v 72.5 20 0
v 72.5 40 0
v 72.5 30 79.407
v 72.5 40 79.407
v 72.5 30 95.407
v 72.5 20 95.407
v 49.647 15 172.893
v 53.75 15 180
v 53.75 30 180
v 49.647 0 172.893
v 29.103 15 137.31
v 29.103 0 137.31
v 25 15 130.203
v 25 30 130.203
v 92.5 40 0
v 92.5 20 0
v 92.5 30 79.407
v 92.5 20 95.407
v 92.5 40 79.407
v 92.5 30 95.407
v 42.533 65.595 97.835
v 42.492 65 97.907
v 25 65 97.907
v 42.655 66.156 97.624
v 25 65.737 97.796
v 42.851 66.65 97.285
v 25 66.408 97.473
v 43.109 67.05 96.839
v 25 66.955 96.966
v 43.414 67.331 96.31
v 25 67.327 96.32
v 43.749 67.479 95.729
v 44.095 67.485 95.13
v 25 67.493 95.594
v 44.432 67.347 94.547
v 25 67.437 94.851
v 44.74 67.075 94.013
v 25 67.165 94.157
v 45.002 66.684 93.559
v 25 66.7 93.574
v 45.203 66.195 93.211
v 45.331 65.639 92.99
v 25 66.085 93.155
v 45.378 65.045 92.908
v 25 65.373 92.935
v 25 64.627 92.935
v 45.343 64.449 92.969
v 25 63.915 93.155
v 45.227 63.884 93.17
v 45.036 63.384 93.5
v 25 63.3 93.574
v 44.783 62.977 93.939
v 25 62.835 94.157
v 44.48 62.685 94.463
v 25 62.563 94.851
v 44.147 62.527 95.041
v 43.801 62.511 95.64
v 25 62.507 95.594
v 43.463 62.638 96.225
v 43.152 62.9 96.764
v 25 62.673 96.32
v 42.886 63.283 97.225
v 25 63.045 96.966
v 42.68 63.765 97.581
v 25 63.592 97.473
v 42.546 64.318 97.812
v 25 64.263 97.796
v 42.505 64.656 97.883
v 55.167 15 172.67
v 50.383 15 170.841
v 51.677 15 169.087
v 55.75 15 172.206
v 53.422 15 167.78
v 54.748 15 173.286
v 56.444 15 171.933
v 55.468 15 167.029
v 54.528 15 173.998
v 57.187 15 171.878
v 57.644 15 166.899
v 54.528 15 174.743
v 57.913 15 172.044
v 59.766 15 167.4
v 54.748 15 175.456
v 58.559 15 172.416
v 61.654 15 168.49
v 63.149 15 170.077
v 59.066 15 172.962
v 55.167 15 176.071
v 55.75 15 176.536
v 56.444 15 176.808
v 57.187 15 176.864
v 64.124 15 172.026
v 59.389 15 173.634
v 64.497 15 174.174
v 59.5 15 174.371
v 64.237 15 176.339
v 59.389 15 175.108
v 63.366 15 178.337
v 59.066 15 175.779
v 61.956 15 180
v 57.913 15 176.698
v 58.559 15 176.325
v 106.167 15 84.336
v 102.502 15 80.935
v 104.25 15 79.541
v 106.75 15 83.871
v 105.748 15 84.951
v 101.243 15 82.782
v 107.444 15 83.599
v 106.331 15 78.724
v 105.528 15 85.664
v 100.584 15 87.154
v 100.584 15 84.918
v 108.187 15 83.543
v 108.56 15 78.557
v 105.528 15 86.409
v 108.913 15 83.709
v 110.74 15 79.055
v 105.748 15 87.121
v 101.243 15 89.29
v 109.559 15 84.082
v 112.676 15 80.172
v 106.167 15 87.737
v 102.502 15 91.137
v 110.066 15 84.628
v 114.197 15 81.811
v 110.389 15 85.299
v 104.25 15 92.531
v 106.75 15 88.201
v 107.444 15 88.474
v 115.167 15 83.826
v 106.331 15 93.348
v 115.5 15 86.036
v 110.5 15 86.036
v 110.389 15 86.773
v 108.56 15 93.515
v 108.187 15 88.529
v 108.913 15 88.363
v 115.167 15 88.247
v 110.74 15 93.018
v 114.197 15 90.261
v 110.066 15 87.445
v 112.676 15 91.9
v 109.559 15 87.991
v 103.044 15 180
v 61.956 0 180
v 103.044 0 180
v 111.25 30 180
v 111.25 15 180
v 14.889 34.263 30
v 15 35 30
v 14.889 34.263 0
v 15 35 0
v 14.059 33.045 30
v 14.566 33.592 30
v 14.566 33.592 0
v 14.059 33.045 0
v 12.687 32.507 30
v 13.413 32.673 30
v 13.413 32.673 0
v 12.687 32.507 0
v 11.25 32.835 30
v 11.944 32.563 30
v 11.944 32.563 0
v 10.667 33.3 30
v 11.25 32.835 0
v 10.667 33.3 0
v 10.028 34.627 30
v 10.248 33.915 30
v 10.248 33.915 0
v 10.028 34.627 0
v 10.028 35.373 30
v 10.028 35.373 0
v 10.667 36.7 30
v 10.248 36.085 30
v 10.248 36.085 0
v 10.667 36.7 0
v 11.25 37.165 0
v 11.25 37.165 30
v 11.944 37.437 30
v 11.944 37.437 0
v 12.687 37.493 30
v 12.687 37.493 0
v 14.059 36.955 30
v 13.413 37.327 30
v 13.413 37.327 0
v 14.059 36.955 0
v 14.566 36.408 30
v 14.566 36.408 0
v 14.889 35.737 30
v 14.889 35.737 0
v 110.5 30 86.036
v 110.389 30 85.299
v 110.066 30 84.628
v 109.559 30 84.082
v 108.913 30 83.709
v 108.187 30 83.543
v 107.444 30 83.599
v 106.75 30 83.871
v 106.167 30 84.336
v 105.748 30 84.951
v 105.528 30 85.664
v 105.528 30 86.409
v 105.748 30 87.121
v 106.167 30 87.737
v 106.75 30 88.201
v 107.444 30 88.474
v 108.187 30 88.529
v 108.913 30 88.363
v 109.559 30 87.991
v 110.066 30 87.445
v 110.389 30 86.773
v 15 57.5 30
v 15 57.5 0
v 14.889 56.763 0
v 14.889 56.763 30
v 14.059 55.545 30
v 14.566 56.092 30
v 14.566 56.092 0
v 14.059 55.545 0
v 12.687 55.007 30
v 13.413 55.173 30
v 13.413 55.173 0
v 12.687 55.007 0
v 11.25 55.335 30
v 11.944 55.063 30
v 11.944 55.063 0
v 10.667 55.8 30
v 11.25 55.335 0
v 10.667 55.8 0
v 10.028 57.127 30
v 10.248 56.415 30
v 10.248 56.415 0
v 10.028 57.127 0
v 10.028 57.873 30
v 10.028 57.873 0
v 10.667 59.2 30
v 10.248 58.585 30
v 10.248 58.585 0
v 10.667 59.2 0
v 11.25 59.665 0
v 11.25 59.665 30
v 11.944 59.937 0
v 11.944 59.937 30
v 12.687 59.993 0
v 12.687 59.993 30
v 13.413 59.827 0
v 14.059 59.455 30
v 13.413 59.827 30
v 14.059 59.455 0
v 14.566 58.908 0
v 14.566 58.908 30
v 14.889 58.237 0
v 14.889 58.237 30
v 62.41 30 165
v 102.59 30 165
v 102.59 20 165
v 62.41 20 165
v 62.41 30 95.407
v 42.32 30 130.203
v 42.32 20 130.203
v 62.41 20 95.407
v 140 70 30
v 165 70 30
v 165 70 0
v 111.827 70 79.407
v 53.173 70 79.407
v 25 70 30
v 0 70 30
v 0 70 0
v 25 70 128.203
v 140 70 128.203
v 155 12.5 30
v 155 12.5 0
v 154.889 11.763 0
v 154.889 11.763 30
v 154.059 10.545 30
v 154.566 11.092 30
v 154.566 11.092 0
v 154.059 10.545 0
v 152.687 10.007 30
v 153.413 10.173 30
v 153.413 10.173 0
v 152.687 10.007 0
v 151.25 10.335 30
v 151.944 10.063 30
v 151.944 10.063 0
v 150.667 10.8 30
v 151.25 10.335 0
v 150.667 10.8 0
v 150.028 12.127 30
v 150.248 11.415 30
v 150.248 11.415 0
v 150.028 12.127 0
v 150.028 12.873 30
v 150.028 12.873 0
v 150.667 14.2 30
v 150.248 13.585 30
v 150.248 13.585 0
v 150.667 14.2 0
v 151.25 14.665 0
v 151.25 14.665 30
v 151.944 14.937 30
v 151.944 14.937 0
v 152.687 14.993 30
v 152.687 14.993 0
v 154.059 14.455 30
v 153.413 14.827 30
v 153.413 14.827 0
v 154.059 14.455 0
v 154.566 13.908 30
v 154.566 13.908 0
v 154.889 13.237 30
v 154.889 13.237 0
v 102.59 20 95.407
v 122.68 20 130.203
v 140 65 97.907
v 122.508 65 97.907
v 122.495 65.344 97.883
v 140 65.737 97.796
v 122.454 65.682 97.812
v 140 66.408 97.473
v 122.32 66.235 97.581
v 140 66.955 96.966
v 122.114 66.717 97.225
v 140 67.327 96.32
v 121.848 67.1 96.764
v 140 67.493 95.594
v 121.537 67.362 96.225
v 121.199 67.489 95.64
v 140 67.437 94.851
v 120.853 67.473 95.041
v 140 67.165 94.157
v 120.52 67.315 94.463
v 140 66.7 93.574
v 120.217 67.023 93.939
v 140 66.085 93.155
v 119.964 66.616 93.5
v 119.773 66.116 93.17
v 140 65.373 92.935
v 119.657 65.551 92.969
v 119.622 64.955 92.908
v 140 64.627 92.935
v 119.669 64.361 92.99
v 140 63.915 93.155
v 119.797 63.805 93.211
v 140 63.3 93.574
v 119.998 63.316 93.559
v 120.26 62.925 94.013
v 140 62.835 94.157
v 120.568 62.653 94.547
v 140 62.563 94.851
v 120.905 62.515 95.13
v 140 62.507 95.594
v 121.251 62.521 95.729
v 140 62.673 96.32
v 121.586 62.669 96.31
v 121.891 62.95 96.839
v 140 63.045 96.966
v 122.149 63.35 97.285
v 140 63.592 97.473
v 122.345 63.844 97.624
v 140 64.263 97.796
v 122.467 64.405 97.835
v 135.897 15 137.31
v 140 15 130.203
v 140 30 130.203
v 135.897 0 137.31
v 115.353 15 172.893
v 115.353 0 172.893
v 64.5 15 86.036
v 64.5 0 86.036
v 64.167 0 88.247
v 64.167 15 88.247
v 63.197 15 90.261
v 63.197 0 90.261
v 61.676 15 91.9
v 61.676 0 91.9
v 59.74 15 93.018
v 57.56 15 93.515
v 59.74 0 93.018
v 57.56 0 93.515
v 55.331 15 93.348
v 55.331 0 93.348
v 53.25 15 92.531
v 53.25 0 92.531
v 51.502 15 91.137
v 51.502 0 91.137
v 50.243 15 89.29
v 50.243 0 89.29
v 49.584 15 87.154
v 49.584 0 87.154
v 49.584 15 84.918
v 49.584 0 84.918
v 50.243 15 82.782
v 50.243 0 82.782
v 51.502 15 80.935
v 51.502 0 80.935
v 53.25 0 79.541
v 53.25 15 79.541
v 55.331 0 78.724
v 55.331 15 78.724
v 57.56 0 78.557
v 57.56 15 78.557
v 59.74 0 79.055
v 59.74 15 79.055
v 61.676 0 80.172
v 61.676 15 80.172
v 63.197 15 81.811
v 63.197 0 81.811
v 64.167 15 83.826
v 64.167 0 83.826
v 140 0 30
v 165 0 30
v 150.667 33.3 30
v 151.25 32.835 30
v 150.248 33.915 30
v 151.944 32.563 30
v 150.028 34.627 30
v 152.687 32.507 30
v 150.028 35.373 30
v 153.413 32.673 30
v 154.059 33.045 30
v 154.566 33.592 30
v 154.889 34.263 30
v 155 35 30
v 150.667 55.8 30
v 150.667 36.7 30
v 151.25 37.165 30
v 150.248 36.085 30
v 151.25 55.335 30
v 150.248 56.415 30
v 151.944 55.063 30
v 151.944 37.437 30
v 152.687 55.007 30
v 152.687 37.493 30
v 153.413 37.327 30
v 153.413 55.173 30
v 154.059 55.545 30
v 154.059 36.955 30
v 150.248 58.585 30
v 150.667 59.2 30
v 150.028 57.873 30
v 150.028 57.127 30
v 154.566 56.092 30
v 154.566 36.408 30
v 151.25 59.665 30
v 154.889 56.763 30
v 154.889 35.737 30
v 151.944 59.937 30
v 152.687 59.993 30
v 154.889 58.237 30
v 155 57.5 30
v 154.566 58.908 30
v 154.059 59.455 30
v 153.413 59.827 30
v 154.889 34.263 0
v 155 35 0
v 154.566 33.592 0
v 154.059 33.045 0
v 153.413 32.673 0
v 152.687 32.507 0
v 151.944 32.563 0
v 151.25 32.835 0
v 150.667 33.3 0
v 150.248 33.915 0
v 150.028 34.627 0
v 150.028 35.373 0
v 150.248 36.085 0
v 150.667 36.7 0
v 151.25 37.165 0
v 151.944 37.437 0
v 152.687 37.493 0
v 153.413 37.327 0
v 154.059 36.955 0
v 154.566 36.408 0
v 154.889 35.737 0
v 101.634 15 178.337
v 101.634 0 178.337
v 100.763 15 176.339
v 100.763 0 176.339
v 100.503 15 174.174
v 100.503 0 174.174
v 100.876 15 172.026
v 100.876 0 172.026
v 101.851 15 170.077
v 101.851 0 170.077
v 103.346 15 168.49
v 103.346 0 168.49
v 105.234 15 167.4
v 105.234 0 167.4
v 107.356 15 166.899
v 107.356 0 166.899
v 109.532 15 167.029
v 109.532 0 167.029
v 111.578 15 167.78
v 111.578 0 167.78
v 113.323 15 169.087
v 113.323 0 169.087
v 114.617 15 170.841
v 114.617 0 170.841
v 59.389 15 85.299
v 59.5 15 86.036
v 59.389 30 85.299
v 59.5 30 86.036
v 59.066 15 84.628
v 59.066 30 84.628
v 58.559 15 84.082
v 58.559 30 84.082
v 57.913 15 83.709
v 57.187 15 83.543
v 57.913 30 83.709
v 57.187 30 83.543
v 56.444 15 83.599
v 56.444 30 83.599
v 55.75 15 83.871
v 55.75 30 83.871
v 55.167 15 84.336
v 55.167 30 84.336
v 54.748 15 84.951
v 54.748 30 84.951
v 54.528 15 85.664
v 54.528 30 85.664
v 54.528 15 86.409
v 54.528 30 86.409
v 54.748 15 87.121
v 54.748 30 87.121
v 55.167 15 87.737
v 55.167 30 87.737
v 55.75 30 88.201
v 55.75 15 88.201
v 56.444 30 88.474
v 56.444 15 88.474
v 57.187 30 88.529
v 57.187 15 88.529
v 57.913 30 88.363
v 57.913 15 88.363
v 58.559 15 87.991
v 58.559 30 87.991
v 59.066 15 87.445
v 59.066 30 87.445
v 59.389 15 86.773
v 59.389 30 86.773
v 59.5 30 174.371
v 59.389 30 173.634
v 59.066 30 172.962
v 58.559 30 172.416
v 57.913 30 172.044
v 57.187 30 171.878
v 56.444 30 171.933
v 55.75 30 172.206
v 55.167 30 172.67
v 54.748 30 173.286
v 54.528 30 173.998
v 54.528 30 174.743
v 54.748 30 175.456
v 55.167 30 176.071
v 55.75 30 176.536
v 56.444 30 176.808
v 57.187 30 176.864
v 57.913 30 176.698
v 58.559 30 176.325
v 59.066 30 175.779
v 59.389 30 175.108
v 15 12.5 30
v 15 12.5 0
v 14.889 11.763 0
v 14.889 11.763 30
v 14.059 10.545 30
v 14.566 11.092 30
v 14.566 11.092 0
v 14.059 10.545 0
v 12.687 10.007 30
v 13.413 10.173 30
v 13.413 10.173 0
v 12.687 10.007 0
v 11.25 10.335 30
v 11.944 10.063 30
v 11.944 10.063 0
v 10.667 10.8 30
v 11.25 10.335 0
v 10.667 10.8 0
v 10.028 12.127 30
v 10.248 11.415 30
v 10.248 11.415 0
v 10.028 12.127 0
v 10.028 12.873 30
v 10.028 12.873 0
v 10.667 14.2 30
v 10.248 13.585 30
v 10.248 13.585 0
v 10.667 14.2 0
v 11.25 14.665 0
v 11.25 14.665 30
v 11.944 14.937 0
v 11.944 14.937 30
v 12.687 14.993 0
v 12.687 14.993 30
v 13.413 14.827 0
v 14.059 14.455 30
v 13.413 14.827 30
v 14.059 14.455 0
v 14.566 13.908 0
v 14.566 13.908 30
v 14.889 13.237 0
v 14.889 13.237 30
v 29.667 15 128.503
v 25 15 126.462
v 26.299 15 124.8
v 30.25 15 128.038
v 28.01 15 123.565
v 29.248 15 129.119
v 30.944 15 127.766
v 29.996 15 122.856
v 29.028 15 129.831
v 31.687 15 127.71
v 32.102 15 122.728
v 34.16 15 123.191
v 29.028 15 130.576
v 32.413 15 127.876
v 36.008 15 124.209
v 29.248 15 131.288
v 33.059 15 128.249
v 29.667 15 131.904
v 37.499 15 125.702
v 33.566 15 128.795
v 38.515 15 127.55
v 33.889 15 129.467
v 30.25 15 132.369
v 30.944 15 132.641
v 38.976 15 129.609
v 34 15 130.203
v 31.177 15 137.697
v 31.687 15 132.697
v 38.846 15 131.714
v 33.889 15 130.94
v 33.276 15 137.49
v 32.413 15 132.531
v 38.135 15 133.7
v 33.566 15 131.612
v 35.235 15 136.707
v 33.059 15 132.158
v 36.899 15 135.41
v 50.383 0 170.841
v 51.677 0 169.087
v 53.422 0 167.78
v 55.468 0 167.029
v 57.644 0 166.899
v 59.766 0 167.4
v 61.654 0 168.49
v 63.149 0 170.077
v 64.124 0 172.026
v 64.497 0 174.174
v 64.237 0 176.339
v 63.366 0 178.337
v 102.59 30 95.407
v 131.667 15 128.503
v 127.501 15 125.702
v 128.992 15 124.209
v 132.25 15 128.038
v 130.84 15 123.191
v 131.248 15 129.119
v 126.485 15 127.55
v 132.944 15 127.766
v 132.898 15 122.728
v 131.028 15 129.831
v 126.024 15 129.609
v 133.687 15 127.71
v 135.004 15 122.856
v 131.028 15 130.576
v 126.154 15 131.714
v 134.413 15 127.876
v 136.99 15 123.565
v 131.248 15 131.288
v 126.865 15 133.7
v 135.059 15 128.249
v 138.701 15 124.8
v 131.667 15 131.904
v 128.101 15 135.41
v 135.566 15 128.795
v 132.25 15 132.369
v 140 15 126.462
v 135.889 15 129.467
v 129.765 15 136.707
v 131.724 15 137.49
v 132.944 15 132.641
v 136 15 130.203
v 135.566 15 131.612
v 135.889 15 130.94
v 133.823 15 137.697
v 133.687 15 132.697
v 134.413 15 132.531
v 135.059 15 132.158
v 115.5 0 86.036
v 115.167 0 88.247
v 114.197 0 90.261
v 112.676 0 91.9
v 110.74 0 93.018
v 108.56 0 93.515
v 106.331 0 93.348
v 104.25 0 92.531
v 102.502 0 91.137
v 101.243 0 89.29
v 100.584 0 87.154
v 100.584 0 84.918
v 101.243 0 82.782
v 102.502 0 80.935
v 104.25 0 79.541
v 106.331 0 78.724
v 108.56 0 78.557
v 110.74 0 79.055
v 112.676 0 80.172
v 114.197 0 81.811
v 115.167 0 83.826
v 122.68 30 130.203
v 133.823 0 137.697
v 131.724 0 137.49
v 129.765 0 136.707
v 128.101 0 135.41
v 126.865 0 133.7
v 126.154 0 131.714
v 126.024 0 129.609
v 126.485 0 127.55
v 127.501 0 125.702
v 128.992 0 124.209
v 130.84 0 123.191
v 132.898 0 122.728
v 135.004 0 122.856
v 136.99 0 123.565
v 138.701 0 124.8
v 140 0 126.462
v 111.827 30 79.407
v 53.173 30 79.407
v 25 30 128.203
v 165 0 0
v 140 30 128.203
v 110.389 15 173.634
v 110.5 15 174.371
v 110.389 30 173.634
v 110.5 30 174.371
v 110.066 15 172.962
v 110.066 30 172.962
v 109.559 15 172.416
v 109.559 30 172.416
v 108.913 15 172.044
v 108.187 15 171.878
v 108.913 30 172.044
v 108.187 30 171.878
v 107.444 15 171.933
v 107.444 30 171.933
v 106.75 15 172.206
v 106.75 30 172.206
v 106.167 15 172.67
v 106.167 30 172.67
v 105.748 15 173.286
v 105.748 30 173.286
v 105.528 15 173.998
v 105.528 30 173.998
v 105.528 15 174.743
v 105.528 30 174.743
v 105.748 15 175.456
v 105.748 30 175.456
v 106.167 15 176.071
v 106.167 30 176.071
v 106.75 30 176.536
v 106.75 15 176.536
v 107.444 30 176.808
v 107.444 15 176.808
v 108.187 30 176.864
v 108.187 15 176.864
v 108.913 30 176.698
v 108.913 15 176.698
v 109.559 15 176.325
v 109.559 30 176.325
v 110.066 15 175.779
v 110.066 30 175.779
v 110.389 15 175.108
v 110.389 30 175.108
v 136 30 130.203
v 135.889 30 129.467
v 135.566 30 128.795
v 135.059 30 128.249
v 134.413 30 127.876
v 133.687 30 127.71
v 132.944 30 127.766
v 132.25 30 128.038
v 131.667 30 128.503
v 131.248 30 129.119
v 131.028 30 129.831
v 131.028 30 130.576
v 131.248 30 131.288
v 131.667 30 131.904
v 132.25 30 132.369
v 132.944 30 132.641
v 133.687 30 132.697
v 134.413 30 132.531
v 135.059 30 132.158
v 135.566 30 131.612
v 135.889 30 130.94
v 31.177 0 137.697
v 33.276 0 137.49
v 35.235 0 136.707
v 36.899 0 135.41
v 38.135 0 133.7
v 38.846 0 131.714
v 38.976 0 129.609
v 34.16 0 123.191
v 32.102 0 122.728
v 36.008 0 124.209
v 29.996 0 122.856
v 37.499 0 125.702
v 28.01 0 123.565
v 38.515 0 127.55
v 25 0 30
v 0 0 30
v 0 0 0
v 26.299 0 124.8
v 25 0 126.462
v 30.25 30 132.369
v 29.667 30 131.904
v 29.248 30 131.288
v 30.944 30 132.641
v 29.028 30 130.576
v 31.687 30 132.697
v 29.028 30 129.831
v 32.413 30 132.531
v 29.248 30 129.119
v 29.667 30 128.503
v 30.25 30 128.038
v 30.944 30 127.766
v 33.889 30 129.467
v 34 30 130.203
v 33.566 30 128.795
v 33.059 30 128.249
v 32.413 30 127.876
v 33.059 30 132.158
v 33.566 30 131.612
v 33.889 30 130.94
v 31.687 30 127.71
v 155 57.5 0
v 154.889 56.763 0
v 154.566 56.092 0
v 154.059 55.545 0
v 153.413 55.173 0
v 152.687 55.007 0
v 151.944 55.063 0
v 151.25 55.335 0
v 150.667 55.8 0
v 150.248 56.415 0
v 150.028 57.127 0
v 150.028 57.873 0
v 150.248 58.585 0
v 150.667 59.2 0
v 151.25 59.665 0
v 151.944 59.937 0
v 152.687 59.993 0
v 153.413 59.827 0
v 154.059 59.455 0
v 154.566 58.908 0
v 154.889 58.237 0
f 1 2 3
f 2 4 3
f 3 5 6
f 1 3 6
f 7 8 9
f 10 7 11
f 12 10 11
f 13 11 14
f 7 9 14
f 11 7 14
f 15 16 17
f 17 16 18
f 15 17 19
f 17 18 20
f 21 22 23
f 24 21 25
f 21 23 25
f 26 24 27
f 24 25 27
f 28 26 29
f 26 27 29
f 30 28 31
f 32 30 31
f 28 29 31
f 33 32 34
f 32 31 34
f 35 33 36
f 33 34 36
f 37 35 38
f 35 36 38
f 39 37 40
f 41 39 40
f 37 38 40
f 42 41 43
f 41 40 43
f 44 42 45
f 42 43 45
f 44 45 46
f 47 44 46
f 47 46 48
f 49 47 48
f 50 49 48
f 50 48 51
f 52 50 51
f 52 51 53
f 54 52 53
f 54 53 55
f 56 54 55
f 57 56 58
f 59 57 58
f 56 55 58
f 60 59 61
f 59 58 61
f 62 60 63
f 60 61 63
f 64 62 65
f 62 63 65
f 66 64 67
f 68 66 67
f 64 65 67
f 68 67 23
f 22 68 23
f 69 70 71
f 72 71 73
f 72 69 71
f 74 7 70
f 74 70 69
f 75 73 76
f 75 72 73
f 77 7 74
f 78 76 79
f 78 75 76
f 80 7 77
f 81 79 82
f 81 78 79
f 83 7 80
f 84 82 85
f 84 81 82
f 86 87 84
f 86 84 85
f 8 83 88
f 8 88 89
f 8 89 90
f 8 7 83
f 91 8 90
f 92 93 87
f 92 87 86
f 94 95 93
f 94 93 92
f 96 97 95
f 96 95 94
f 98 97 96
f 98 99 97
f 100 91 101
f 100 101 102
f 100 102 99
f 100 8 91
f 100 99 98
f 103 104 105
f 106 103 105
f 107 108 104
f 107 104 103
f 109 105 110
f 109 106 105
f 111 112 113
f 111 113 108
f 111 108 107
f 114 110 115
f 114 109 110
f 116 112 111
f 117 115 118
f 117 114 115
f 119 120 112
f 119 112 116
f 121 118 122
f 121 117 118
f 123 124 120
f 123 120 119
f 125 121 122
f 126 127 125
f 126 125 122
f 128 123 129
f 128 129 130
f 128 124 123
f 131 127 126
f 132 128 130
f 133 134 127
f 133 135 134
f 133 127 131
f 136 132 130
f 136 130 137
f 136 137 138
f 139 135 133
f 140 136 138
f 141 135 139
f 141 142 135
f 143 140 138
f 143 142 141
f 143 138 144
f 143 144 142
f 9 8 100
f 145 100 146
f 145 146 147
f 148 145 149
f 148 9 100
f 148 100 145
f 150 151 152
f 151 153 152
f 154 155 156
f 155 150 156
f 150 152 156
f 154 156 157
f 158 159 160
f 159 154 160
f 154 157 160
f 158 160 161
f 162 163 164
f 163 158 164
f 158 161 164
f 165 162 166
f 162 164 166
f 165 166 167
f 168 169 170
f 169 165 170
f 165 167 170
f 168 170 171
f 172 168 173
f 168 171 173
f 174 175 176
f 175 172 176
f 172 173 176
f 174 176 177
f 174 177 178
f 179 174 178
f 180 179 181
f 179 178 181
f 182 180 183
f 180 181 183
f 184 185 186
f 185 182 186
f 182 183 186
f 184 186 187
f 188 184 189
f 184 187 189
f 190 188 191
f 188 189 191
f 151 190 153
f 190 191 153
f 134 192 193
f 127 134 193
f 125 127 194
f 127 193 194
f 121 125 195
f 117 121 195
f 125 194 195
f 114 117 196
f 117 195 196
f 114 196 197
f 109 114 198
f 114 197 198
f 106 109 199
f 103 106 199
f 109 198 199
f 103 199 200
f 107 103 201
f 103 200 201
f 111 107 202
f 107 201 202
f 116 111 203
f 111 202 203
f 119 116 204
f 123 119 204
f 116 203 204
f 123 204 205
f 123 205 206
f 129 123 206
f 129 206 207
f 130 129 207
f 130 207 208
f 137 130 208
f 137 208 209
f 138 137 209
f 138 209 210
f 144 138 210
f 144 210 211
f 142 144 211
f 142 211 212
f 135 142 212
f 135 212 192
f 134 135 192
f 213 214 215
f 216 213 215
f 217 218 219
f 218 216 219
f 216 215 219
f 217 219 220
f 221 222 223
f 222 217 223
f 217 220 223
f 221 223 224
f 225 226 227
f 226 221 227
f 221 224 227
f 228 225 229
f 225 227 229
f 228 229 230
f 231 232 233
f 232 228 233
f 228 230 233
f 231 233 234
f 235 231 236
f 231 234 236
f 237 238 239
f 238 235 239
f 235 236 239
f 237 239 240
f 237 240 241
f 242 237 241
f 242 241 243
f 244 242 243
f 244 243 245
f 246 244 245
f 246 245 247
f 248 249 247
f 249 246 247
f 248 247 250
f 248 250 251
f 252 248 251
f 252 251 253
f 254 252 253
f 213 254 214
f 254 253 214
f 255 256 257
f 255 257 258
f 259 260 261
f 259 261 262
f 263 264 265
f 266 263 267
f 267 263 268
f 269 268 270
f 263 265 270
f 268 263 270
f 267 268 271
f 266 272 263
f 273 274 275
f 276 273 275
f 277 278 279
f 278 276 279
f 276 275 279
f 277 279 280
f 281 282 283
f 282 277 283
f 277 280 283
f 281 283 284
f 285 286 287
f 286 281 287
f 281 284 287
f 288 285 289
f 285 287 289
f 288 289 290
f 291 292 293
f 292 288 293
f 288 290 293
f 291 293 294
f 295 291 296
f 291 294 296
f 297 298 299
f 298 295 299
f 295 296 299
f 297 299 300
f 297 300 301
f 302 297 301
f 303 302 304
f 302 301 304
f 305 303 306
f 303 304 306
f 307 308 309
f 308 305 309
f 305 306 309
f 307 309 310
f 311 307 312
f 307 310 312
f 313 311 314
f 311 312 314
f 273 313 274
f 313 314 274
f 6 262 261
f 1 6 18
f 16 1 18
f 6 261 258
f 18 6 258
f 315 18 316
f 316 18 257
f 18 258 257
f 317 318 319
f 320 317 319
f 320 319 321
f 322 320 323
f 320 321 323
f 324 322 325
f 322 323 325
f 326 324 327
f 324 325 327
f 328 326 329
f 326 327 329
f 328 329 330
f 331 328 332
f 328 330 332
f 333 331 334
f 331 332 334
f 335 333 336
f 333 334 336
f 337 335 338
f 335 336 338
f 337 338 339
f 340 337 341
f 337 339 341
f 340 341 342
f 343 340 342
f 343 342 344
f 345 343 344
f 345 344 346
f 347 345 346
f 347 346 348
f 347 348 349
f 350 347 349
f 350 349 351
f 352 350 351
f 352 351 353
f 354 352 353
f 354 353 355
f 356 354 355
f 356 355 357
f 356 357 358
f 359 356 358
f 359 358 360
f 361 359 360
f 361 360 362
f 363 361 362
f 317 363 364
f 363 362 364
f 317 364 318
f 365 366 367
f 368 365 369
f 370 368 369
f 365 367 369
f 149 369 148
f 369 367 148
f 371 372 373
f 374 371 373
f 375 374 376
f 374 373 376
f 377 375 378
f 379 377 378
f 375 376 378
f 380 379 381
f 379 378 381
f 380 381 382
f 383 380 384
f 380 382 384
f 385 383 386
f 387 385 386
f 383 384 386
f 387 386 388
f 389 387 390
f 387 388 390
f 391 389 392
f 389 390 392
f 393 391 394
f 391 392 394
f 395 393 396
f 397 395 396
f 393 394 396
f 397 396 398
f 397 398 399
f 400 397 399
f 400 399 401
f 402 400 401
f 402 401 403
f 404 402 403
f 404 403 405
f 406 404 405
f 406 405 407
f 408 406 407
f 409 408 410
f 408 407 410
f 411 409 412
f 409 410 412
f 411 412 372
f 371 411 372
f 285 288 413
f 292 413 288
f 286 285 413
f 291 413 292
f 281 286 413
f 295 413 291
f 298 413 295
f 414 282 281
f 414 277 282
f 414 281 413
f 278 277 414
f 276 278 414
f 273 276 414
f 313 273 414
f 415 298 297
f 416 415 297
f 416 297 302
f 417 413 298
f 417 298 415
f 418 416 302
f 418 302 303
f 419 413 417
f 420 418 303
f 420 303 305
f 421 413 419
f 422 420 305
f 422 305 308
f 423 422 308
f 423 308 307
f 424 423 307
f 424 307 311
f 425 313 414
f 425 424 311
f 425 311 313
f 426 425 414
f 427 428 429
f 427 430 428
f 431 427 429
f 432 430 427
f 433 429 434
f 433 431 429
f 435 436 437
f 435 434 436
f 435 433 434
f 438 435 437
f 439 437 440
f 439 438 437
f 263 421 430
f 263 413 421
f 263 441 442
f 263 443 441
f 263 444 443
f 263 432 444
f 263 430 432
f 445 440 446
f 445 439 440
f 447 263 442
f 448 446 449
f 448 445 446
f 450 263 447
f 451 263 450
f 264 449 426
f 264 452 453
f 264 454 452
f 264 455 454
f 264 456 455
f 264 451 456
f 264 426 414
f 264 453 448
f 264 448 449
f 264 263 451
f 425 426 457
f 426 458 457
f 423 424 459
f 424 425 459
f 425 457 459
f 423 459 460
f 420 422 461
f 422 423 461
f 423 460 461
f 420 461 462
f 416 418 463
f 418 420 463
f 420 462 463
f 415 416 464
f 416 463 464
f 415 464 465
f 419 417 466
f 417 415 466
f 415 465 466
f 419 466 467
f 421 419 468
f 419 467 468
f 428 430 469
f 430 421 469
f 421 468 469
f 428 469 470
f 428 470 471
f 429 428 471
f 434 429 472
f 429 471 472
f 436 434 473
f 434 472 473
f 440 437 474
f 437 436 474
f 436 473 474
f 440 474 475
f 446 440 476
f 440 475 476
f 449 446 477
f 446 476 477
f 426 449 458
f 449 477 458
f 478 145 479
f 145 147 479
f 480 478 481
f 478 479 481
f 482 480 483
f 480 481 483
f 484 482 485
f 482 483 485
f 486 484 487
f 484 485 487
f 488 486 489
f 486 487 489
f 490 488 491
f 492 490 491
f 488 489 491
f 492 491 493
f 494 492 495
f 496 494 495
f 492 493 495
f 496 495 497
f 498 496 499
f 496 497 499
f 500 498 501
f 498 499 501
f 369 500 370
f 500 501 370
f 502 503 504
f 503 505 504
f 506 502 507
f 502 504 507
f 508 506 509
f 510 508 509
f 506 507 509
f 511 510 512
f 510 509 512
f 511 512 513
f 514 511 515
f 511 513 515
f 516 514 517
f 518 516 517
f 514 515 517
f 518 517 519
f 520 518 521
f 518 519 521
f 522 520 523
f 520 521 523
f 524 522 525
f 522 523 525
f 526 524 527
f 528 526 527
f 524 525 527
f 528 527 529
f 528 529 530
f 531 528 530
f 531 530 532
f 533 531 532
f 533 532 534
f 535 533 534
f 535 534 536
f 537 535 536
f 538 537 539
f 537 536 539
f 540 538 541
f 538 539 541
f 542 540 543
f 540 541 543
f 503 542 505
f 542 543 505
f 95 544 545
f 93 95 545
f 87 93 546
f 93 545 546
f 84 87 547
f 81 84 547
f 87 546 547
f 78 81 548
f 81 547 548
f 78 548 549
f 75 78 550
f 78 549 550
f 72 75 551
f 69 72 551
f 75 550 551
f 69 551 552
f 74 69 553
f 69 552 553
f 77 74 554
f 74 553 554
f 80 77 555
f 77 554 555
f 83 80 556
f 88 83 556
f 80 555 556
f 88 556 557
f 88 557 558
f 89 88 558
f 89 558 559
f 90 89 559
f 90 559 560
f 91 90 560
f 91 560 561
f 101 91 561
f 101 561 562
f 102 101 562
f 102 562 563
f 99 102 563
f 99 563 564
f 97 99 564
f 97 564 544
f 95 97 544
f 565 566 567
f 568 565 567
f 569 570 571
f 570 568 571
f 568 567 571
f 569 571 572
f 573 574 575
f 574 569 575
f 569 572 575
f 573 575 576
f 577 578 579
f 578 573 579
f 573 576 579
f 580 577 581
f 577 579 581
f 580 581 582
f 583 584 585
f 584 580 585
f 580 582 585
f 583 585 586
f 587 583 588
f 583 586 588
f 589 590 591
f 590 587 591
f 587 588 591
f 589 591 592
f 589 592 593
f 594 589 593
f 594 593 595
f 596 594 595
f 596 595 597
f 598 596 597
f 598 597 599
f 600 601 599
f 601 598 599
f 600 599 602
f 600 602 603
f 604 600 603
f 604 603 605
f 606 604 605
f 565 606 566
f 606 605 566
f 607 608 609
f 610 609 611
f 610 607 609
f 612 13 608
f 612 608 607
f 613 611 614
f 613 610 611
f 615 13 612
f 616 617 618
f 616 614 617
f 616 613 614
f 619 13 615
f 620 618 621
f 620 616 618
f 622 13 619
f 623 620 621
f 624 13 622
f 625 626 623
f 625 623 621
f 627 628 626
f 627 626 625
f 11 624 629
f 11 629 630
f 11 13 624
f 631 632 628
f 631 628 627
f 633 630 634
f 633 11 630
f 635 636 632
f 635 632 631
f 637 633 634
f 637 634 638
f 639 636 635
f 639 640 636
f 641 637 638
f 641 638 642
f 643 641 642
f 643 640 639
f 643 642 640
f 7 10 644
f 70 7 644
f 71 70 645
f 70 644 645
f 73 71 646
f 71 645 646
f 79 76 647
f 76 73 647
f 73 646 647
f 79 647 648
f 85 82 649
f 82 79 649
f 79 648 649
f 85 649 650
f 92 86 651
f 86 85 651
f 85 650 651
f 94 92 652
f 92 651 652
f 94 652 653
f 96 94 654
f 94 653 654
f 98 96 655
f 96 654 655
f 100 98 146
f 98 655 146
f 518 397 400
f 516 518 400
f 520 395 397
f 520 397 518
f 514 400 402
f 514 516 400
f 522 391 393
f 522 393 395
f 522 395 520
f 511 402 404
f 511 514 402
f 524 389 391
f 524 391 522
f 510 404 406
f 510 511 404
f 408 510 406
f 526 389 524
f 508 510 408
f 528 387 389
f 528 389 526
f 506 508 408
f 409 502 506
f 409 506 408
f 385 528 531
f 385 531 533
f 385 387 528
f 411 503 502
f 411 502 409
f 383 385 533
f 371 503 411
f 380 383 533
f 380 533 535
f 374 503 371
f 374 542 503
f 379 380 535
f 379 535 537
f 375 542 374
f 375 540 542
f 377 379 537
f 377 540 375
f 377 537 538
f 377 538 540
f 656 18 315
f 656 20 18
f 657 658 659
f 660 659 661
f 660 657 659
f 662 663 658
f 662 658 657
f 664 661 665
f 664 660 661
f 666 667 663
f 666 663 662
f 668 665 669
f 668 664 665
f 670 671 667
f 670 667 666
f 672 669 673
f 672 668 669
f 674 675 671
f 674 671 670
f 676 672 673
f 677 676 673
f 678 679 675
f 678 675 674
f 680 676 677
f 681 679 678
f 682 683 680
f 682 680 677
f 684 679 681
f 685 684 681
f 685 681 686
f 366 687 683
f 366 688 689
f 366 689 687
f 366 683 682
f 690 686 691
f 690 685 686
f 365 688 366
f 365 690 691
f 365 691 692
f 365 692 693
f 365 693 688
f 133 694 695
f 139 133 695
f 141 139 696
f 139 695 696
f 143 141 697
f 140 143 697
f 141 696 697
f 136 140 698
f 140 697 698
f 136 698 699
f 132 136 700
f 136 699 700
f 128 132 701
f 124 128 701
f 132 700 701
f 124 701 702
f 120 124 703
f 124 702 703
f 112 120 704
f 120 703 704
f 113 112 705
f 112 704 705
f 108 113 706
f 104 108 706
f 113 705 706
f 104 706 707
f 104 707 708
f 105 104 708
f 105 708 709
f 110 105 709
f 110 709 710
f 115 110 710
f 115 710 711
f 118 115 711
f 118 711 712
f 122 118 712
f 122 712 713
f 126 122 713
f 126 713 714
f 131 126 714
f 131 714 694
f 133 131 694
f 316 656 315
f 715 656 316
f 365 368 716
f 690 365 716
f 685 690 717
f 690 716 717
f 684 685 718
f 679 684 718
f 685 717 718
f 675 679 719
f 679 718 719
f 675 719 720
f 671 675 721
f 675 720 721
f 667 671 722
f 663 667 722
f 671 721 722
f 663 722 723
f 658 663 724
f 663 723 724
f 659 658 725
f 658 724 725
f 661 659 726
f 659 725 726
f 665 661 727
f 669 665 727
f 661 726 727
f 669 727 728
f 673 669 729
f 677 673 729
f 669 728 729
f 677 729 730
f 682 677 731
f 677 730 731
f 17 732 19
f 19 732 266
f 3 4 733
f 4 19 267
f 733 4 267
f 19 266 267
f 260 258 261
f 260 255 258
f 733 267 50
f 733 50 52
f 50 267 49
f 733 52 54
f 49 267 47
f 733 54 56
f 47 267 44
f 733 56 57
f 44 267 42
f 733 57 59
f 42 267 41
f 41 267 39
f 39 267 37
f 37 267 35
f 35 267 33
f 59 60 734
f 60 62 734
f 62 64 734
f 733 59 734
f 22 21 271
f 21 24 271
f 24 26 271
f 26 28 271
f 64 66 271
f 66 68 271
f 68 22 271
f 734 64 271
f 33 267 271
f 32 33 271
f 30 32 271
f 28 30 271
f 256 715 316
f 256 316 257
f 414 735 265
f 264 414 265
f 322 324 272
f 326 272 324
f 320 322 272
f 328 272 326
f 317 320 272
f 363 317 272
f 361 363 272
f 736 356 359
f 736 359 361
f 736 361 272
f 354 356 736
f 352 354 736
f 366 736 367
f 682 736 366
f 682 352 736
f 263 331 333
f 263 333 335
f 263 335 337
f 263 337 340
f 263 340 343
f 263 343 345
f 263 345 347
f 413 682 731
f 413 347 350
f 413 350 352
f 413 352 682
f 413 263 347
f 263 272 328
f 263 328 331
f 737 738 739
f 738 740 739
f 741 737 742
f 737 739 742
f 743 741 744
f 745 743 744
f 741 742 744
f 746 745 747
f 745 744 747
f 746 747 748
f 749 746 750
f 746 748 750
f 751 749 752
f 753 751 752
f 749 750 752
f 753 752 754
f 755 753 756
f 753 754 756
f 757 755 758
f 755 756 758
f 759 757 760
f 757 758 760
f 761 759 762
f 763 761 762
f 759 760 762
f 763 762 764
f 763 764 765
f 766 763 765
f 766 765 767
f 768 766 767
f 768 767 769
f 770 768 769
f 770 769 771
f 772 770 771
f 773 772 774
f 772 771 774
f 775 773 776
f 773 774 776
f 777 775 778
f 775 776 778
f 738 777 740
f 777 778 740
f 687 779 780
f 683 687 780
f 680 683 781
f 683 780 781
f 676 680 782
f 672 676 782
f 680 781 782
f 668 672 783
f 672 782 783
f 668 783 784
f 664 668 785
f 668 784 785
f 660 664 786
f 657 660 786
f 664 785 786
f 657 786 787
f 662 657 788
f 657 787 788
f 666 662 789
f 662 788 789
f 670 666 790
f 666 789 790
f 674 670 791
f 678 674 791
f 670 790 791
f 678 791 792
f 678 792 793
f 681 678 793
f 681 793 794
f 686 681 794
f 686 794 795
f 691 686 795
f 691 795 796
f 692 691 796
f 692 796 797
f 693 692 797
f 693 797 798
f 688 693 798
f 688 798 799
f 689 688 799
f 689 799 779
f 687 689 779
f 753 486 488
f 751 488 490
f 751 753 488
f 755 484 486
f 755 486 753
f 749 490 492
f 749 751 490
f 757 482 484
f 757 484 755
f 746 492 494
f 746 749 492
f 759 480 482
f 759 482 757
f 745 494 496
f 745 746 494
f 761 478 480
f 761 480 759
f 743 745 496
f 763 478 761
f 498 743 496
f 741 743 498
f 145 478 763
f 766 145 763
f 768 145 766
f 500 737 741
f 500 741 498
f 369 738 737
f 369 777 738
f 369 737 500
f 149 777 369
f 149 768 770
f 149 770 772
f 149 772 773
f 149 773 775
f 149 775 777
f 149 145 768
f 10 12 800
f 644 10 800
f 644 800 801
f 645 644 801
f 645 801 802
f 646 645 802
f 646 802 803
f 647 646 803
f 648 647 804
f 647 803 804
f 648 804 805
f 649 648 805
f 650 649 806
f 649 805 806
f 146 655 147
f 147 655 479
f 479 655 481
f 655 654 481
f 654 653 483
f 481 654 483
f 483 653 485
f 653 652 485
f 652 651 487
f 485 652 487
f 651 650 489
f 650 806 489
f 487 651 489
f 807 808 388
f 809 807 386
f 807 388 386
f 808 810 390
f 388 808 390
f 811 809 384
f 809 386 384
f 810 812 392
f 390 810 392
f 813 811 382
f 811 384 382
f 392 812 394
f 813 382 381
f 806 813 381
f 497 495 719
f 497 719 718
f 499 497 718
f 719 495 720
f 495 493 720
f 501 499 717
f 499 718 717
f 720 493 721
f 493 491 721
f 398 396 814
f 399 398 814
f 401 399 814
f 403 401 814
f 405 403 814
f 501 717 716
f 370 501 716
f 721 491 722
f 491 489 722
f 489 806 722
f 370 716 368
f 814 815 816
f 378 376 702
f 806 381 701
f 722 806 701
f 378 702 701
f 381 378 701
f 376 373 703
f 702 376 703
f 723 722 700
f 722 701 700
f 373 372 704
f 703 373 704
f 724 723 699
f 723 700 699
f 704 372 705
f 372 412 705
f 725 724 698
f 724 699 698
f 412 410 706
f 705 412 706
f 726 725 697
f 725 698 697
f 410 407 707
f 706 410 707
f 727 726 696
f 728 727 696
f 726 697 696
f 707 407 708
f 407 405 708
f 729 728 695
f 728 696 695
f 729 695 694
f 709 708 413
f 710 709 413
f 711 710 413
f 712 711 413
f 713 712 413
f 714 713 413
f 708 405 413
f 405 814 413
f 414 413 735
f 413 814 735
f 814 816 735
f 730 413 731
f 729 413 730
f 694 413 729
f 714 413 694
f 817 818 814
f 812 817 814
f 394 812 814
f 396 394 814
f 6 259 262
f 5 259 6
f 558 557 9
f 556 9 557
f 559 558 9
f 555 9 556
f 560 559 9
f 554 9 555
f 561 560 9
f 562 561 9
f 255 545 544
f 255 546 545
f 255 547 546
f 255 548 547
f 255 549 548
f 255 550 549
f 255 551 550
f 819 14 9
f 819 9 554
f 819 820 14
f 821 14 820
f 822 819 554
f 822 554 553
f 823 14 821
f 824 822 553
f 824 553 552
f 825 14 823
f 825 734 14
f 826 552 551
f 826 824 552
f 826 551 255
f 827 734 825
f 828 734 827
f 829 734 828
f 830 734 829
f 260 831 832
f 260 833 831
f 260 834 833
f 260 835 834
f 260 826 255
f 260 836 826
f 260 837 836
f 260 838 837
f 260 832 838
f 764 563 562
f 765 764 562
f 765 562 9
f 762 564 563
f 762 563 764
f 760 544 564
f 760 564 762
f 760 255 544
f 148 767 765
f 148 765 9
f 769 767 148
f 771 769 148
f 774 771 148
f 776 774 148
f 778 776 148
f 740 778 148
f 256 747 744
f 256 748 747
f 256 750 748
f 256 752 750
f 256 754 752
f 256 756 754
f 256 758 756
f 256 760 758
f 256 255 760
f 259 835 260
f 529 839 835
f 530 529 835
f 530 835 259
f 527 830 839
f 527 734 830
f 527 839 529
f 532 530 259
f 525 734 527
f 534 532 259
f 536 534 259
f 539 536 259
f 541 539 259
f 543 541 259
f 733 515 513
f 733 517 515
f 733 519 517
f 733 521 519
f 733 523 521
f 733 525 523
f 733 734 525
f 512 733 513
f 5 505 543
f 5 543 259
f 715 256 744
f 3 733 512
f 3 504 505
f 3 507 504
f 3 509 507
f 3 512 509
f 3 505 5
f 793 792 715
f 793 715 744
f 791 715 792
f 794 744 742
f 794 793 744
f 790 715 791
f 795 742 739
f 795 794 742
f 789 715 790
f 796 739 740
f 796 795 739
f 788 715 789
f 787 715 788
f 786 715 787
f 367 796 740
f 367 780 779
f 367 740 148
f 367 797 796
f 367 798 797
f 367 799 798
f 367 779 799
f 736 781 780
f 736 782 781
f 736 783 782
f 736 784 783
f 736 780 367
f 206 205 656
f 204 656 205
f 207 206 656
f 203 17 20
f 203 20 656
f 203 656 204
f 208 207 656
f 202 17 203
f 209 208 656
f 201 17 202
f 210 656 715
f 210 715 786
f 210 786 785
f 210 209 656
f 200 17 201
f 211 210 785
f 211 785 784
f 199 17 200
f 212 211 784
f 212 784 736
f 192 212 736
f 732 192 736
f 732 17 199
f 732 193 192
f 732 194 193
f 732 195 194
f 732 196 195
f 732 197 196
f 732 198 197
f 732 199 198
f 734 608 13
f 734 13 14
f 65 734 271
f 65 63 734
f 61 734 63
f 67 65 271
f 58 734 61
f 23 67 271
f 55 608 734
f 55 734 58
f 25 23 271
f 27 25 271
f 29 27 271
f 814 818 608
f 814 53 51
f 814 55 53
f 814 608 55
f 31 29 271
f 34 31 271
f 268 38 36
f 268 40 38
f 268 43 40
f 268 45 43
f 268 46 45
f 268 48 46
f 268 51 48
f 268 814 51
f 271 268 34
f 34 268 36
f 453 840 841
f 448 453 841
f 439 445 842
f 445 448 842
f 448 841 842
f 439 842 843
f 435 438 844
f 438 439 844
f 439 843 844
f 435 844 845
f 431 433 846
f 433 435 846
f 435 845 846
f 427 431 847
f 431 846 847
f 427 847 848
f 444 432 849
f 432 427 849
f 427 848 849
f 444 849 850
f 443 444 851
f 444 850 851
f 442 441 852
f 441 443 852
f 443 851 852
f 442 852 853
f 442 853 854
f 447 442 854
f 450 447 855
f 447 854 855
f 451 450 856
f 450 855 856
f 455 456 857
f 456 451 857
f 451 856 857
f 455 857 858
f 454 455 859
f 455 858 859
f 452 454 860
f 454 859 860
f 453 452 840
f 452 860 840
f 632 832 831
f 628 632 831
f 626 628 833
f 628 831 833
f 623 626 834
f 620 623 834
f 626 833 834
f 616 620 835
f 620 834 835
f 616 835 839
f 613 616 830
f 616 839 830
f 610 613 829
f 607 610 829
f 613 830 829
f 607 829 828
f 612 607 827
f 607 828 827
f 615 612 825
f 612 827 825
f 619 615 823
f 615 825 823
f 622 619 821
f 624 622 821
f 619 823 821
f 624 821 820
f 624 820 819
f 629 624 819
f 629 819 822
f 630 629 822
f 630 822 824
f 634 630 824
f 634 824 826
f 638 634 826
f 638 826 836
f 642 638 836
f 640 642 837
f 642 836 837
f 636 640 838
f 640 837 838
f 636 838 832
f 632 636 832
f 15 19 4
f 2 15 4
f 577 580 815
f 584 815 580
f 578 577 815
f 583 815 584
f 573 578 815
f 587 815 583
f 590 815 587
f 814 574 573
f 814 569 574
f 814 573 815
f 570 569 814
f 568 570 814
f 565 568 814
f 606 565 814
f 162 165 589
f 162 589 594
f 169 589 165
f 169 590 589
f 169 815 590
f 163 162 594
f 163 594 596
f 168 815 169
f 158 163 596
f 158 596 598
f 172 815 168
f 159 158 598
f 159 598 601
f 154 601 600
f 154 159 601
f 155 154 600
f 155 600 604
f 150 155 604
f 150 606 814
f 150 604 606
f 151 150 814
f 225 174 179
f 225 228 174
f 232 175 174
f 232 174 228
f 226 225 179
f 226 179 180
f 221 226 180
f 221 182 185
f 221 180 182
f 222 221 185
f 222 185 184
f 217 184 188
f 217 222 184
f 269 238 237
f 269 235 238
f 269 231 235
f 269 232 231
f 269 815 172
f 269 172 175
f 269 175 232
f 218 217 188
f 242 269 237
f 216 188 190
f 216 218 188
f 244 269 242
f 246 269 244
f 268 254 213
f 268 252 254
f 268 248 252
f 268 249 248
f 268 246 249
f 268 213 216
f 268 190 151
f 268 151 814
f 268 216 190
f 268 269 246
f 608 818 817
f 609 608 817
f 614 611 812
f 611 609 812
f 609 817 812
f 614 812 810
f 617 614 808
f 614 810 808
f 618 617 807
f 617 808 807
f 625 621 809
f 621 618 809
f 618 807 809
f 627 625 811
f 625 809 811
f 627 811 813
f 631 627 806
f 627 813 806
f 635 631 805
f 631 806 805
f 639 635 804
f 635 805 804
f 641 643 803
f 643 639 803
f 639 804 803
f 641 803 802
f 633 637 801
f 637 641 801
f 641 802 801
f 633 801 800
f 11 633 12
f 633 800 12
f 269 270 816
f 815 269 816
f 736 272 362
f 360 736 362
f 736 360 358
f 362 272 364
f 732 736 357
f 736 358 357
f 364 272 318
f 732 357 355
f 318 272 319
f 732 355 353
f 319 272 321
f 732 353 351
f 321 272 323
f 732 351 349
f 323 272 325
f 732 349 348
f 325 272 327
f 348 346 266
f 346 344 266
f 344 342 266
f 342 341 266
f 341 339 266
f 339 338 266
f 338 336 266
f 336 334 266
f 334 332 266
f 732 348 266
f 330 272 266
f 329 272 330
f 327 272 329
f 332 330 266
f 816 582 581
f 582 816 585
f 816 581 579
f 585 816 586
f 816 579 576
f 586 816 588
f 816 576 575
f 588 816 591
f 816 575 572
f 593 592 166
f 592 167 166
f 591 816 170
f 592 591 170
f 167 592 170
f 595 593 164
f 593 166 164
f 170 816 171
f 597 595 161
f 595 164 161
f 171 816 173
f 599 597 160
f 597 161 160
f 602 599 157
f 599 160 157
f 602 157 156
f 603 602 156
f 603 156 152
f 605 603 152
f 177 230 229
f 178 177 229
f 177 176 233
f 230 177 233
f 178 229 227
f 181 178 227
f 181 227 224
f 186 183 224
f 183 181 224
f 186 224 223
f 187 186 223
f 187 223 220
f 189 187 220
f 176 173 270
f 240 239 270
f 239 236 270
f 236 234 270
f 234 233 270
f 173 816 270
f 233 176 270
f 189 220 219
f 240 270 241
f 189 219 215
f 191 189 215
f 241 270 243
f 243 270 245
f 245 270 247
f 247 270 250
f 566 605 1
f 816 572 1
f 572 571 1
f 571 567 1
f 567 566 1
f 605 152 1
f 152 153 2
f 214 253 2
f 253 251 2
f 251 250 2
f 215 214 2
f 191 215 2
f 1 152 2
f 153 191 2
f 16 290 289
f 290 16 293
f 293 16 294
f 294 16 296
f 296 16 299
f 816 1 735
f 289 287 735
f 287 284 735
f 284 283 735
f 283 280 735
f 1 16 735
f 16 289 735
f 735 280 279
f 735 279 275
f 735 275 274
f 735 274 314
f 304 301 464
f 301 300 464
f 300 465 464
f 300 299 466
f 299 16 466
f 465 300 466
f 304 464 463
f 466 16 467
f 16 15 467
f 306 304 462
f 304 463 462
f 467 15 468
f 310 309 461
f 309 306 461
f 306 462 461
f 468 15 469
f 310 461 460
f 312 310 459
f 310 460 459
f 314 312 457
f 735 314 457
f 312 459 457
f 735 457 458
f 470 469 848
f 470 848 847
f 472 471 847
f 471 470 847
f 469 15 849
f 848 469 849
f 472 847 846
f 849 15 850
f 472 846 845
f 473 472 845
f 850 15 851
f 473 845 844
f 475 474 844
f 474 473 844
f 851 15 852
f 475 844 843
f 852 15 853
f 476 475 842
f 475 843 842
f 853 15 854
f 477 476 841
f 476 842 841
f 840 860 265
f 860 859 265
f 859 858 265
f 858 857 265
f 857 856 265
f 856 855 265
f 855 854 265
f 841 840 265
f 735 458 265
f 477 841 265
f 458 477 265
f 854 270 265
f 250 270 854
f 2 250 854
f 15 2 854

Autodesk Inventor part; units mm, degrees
ref_plane "YZ Plane" through (0, 0, 0) normal (1, 0, 0) x (0, 1, 0)
ref_plane "XZ Plane" through (0, 0, 0) normal (0, 1, 0) x (-1, 0, 0)
ref_plane "XY Plane" through (0, 0, 0) normal (0, 0, 1) x (1, 0, 0)
sketch "Sketch24" plane through (0, 0, 0) normal (0, 0, 1) x (1, 0, 0)
  line L0 (0, 0) -> (165, 0)
  line L1 (165, 0) -> (165, 70)
  line L2 (165, 70) -> (0, 70)
  line L3 (0, 70) -> (0, 0)
  circle A0 centre (12.5, 57.5) radius 2.5
  circle A1 centre (12.5, 35) radius 2.5
  circle A2 centre (12.5, 12.5) radius 2.5
  line L4 (12.5, 57.5) -> (12.5, 12.5) construction
  line L5 (82.5, 70) -> (82.5, 0) construction
  circle A3 centre (152.5, 57.5) radius 2.5
  circle A4 centre (152.5, 35) radius 2.5
  circle A5 centre (152.5, 12.5) radius 2.5
  line L6 (152.5, 57.5) -> (152.5, 12.5) construction
  point P0 (0, 35)
  dimension "d100" = 165
  dimension "d101" = 70
  dimension "d102" = 5
  dimension "d103" = 5
  dimension "d104" = 5
  dimension "d105" = 45
  dimension "d106" = 12.5
extrude "Extrusion21" add sketch "Sketch24" along normal blind 30
sketch "Sketch25" plane through (0, 0, 30) normal (0, 0, 1) x (1, 0, 0)
  line L0 (165, 70) -> (0, 70) projected
  line L1 (0, 0) -> (165, 0) projected
  line L2 (25, 70) -> (140, 70)
  line L3 (140, 70) -> (140, 0)
  line L4 (140, 0) -> (25, 0)
  line L5 (25, 0) -> (25, 70)
  point P0 (82.5, 70)
  dimension "d109" = 115
extrude "Extrusion22" add sketch "Sketch25" along normal blind 150
sketch "Sketch26" plane through (0, 70, 0) normal (0, 1, 0) x (1, 0, 0)
  line L0 (25, -30) -> (25, -180) projected
  line L1 (25, -130.2035) -> (53.75, -80.4071)
  line L2 (53.75, -80.4071) -> (111.25, -80.4071)
  line L3 (111.25, -80.4071) -> (140, -130.2035)
  line L4 (140, -130.2035) -> (111.25, -180)
  line L5 (111.25, -180) -> (53.75, -180)
  line L6 (53.75, -180) -> (25, -130.2035)
  line L7 (140, -30) -> (140, -180) projected
  line L8 (140, -180) -> (25, -180) projected
  point P0 (0, 0)
  point P1 (82.5, -130.2035)
  point P2 (82.5, -180)
extrude "Extrusion23" cut sketch "Sketch26" against normal through all contours L6 L8 L0 | L4 L7 L8
sketch "Sketch27" plane through (0, 70, 0) normal (0, 1, 0) x (1, 0, 0)
  line L0 (25, -130.2035) -> (53.75, -180) projected
  line L1 (111.25, -180) -> (53.75, -180) projected
  line L2 (111.25, -180) -> (140, -130.2035) projected
  line L3 (53.75, -180) -> (25, -130.2035)
  line L4 (25, -130.2035) -> (53.75, -80.4071)
  line L5 (53.75, -80.4071) -> (111.25, -80.4071)
  line L6 (111.25, -80.4071) -> (140, -130.2035)
  line L7 (140, -130.2035) -> (111.25, -180)
  line L8 (111.25, -180) -> (53.75, -180)
  line L9 (53.1726, -79.4071) -> (23.8453, -130.2035)
  line L10 (23.8453, -130.2035) -> (53.1726, -181)
  line L11 (53.1726, -181) -> (111.8274, -181)
  line L12 (111.8274, -181) -> (141.1547, -130.2035)
  line L13 (141.1547, -130.2035) -> (111.8274, -79.4071)
  line L14 (111.8274, -79.4071) -> (53.1726, -79.4071)
  point P0 (0, 0)
  point P1 (82.5, -130.2035)
  dimension "d114" = 1
extrude "Extrusion24" cut sketch "Sketch27" against normal blind 40 contours L4 L5 L6 L2 L1 L0 | L14 L13 L12 L11 L10 L9
sketch "Sketch28" plane through (0, 30, 0) normal (0, 1, 0) x (1, 0, 0)
  circle A0 centre (31.5, -130.2035) radius 2.5
  line L0 (53.75, -180) -> (25, -130.2035) projected
  line L1 (140, -128.2035) -> (140, -130.2035) construction
  line L2 (25, -130.2035) -> (140, -130.2035) construction
  circle A1 centre (82.5, -130.2035) radius 2.5 construction
  circle A2 centre (133.5, -130.2035) radius 2.5 construction
  line L3 (31.5, -130.2035) -> (133.5, -130.2035) construction
  circle A3 centre (57, -174.3708) radius 2.5
  circle A4 centre (108, -174.3708) radius 2.5
  circle A5 centre (133.5, -130.2035) radius 2.5
  circle A6 centre (108, -86.0362) radius 2.5
  circle A7 centre (57, -86.0362) radius 2.5
  point P0 (0, 0)
  dimension "d117" = 5
  dimension "d118" = 5
  dimension "d119" = 5
  dimension "d120" = 102
  dimension "d123" = 360
extrude "Extrusion25" cut sketch "Sketch28" against normal through all
sketch "Sketch29" plane through (0, 0, 0) normal (0, -1, 0) x (1, 0, 0)
  circle A0 centre (57, 174.3708) radius 2.5 construction
  circle A1 centre (108, 86.0362) radius 2.5 construction
  line L0 (57, 174.3708) -> (108, 86.0362) construction
  circle A2 centre (57, 174.3708) radius 7.5
  line L1 (31.5, 130.2035) -> (133.5, 130.2035) construction
  circle A3 centre (31.5, 130.2035) radius 7.5
  line L2 (57, 86.0362) -> (108, 174.3708) construction
  circle A4 centre (57, 86.0362) radius 7.5
  line L3 (108, 86.0362) -> (57, 174.3708) construction
  circle A5 centre (108, 86.0362) radius 7.5
  line L4 (133.5, 130.2035) -> (31.5, 130.2035) construction
  circle A6 centre (133.5, 130.2035) radius 7.5
  line L5 (108, 174.3708) -> (57, 86.0362) construction
  circle A7 centre (108, 174.3708) radius 7.5
  point P0 (0, 0)
  point P1 (82.5, 130.2035)
  point P2 (82.5, 130.2035)
  point P3 (82.5, 130.2035)
  point P4 (82.5, 130.2035)
  point P5 (82.5, 130.2035)
  point P6 (82.5, 130.2035)
  dimension "d127" = 15
  dimension "d130" = 360
extrude "Extrusion26" cut sketch "Sketch29" against normal blind 15
sketch "Sketch30" plane through (0, 30, 0) normal (0, 1, 0) x (1, 0, 0)
  line L0 (53.75, -180) -> (25, -130.2035) construction
  line L1 (111.25, -180) -> (53.75, -180) construction
  line L2 (140, -130.2035) -> (111.25, -180) construction
  circle A0 centre (133.5, -130.2035) radius 2.5 construction
  circle A1 centre (31.5, -130.2035) radius 2.5 construction
  circle A2 centre (133.5, -130.2035) radius 2.5 construction
  line L3 (31.5, -130.2035) -> (133.5, -130.2035) construction
  line L4 (102.5897, -165) -> (62.4103, -165)
  line L5 (62.4103, -165) -> (42.3205, -130.2035)
  line L6 (42.3205, -130.2035) -> (62.4103, -95.4071)
  line L7 (62.4103, -95.4071) -> (102.5897, -95.4071)
  line L8 (102.5897, -95.4071) -> (122.6795, -130.2035)
  line L9 (122.6795, -130.2035) -> (102.5897, -165)
  point P0 (0, 0)
  point P1 (82.5, -130.2035)
  point P2 (82.5, -130.2035)
  dimension "d134" = 15
extrude "Extrusion27" cut sketch "Sketch30" against normal blind 10
sketch "Sketch31" plane through (62.4103, 30, 95.4071) normal (0, 0, 1) x (1, 0, 0)
  line L0 (-9.2376, 40) -> (49.4171, 40) projected
  line L1 (-9.2376, 40) -> (-9.2376, 0) projected
  line L2 (-9.2376, 0) -> (49.4171, 0) projected
  line L3 (49.4171, 40) -> (49.4171, 0) projected
  line L4 (0, 0) -> (40.1795, 0) projected
  line L5 (0, 0) -> (0, -10) projected
  line L6 (0, -10) -> (40.1795, -10) projected
  line L7 (40.1795, 0) -> (40.1795, -10) projected
  line L8 (10.0897, -10) -> (30.0897, -10)
  line L9 (30.0897, -10) -> (30.0897, 10)
  line L10 (30.0897, 10) -> (10.0897, 10)
  line L11 (10.0897, 10) -> (10.0897, -10)
  point P0 (-62.4103, -30)
  point P1 (20.0897, -10)
  dimension "d137" = 20
  dimension "d138" = 20
extrude "Extrusion28" cut sketch "Sketch31" against normal through all contours L11 L10 L9 L2 | L2 L9 L6 L11
sketch "Sketch32" plane through (25, 0, 30) normal (-1, 0, 0) x (0, 0, 1)
  circle A0 centre (65.4071, 65) radius 2.5
  line L0 (0, 70) -> (98.2035, 70) projected
  point P0 (-30, 0)
  point P1 (49.4071, 70)
  dimension "d141" = 5
  dimension "d142" = 5
  dimension "d143" = 16
extrude "Extrusion29" cut sketch "Sketch32" against normal through all
properties part number "TARM01" material "ABS Plastic"
